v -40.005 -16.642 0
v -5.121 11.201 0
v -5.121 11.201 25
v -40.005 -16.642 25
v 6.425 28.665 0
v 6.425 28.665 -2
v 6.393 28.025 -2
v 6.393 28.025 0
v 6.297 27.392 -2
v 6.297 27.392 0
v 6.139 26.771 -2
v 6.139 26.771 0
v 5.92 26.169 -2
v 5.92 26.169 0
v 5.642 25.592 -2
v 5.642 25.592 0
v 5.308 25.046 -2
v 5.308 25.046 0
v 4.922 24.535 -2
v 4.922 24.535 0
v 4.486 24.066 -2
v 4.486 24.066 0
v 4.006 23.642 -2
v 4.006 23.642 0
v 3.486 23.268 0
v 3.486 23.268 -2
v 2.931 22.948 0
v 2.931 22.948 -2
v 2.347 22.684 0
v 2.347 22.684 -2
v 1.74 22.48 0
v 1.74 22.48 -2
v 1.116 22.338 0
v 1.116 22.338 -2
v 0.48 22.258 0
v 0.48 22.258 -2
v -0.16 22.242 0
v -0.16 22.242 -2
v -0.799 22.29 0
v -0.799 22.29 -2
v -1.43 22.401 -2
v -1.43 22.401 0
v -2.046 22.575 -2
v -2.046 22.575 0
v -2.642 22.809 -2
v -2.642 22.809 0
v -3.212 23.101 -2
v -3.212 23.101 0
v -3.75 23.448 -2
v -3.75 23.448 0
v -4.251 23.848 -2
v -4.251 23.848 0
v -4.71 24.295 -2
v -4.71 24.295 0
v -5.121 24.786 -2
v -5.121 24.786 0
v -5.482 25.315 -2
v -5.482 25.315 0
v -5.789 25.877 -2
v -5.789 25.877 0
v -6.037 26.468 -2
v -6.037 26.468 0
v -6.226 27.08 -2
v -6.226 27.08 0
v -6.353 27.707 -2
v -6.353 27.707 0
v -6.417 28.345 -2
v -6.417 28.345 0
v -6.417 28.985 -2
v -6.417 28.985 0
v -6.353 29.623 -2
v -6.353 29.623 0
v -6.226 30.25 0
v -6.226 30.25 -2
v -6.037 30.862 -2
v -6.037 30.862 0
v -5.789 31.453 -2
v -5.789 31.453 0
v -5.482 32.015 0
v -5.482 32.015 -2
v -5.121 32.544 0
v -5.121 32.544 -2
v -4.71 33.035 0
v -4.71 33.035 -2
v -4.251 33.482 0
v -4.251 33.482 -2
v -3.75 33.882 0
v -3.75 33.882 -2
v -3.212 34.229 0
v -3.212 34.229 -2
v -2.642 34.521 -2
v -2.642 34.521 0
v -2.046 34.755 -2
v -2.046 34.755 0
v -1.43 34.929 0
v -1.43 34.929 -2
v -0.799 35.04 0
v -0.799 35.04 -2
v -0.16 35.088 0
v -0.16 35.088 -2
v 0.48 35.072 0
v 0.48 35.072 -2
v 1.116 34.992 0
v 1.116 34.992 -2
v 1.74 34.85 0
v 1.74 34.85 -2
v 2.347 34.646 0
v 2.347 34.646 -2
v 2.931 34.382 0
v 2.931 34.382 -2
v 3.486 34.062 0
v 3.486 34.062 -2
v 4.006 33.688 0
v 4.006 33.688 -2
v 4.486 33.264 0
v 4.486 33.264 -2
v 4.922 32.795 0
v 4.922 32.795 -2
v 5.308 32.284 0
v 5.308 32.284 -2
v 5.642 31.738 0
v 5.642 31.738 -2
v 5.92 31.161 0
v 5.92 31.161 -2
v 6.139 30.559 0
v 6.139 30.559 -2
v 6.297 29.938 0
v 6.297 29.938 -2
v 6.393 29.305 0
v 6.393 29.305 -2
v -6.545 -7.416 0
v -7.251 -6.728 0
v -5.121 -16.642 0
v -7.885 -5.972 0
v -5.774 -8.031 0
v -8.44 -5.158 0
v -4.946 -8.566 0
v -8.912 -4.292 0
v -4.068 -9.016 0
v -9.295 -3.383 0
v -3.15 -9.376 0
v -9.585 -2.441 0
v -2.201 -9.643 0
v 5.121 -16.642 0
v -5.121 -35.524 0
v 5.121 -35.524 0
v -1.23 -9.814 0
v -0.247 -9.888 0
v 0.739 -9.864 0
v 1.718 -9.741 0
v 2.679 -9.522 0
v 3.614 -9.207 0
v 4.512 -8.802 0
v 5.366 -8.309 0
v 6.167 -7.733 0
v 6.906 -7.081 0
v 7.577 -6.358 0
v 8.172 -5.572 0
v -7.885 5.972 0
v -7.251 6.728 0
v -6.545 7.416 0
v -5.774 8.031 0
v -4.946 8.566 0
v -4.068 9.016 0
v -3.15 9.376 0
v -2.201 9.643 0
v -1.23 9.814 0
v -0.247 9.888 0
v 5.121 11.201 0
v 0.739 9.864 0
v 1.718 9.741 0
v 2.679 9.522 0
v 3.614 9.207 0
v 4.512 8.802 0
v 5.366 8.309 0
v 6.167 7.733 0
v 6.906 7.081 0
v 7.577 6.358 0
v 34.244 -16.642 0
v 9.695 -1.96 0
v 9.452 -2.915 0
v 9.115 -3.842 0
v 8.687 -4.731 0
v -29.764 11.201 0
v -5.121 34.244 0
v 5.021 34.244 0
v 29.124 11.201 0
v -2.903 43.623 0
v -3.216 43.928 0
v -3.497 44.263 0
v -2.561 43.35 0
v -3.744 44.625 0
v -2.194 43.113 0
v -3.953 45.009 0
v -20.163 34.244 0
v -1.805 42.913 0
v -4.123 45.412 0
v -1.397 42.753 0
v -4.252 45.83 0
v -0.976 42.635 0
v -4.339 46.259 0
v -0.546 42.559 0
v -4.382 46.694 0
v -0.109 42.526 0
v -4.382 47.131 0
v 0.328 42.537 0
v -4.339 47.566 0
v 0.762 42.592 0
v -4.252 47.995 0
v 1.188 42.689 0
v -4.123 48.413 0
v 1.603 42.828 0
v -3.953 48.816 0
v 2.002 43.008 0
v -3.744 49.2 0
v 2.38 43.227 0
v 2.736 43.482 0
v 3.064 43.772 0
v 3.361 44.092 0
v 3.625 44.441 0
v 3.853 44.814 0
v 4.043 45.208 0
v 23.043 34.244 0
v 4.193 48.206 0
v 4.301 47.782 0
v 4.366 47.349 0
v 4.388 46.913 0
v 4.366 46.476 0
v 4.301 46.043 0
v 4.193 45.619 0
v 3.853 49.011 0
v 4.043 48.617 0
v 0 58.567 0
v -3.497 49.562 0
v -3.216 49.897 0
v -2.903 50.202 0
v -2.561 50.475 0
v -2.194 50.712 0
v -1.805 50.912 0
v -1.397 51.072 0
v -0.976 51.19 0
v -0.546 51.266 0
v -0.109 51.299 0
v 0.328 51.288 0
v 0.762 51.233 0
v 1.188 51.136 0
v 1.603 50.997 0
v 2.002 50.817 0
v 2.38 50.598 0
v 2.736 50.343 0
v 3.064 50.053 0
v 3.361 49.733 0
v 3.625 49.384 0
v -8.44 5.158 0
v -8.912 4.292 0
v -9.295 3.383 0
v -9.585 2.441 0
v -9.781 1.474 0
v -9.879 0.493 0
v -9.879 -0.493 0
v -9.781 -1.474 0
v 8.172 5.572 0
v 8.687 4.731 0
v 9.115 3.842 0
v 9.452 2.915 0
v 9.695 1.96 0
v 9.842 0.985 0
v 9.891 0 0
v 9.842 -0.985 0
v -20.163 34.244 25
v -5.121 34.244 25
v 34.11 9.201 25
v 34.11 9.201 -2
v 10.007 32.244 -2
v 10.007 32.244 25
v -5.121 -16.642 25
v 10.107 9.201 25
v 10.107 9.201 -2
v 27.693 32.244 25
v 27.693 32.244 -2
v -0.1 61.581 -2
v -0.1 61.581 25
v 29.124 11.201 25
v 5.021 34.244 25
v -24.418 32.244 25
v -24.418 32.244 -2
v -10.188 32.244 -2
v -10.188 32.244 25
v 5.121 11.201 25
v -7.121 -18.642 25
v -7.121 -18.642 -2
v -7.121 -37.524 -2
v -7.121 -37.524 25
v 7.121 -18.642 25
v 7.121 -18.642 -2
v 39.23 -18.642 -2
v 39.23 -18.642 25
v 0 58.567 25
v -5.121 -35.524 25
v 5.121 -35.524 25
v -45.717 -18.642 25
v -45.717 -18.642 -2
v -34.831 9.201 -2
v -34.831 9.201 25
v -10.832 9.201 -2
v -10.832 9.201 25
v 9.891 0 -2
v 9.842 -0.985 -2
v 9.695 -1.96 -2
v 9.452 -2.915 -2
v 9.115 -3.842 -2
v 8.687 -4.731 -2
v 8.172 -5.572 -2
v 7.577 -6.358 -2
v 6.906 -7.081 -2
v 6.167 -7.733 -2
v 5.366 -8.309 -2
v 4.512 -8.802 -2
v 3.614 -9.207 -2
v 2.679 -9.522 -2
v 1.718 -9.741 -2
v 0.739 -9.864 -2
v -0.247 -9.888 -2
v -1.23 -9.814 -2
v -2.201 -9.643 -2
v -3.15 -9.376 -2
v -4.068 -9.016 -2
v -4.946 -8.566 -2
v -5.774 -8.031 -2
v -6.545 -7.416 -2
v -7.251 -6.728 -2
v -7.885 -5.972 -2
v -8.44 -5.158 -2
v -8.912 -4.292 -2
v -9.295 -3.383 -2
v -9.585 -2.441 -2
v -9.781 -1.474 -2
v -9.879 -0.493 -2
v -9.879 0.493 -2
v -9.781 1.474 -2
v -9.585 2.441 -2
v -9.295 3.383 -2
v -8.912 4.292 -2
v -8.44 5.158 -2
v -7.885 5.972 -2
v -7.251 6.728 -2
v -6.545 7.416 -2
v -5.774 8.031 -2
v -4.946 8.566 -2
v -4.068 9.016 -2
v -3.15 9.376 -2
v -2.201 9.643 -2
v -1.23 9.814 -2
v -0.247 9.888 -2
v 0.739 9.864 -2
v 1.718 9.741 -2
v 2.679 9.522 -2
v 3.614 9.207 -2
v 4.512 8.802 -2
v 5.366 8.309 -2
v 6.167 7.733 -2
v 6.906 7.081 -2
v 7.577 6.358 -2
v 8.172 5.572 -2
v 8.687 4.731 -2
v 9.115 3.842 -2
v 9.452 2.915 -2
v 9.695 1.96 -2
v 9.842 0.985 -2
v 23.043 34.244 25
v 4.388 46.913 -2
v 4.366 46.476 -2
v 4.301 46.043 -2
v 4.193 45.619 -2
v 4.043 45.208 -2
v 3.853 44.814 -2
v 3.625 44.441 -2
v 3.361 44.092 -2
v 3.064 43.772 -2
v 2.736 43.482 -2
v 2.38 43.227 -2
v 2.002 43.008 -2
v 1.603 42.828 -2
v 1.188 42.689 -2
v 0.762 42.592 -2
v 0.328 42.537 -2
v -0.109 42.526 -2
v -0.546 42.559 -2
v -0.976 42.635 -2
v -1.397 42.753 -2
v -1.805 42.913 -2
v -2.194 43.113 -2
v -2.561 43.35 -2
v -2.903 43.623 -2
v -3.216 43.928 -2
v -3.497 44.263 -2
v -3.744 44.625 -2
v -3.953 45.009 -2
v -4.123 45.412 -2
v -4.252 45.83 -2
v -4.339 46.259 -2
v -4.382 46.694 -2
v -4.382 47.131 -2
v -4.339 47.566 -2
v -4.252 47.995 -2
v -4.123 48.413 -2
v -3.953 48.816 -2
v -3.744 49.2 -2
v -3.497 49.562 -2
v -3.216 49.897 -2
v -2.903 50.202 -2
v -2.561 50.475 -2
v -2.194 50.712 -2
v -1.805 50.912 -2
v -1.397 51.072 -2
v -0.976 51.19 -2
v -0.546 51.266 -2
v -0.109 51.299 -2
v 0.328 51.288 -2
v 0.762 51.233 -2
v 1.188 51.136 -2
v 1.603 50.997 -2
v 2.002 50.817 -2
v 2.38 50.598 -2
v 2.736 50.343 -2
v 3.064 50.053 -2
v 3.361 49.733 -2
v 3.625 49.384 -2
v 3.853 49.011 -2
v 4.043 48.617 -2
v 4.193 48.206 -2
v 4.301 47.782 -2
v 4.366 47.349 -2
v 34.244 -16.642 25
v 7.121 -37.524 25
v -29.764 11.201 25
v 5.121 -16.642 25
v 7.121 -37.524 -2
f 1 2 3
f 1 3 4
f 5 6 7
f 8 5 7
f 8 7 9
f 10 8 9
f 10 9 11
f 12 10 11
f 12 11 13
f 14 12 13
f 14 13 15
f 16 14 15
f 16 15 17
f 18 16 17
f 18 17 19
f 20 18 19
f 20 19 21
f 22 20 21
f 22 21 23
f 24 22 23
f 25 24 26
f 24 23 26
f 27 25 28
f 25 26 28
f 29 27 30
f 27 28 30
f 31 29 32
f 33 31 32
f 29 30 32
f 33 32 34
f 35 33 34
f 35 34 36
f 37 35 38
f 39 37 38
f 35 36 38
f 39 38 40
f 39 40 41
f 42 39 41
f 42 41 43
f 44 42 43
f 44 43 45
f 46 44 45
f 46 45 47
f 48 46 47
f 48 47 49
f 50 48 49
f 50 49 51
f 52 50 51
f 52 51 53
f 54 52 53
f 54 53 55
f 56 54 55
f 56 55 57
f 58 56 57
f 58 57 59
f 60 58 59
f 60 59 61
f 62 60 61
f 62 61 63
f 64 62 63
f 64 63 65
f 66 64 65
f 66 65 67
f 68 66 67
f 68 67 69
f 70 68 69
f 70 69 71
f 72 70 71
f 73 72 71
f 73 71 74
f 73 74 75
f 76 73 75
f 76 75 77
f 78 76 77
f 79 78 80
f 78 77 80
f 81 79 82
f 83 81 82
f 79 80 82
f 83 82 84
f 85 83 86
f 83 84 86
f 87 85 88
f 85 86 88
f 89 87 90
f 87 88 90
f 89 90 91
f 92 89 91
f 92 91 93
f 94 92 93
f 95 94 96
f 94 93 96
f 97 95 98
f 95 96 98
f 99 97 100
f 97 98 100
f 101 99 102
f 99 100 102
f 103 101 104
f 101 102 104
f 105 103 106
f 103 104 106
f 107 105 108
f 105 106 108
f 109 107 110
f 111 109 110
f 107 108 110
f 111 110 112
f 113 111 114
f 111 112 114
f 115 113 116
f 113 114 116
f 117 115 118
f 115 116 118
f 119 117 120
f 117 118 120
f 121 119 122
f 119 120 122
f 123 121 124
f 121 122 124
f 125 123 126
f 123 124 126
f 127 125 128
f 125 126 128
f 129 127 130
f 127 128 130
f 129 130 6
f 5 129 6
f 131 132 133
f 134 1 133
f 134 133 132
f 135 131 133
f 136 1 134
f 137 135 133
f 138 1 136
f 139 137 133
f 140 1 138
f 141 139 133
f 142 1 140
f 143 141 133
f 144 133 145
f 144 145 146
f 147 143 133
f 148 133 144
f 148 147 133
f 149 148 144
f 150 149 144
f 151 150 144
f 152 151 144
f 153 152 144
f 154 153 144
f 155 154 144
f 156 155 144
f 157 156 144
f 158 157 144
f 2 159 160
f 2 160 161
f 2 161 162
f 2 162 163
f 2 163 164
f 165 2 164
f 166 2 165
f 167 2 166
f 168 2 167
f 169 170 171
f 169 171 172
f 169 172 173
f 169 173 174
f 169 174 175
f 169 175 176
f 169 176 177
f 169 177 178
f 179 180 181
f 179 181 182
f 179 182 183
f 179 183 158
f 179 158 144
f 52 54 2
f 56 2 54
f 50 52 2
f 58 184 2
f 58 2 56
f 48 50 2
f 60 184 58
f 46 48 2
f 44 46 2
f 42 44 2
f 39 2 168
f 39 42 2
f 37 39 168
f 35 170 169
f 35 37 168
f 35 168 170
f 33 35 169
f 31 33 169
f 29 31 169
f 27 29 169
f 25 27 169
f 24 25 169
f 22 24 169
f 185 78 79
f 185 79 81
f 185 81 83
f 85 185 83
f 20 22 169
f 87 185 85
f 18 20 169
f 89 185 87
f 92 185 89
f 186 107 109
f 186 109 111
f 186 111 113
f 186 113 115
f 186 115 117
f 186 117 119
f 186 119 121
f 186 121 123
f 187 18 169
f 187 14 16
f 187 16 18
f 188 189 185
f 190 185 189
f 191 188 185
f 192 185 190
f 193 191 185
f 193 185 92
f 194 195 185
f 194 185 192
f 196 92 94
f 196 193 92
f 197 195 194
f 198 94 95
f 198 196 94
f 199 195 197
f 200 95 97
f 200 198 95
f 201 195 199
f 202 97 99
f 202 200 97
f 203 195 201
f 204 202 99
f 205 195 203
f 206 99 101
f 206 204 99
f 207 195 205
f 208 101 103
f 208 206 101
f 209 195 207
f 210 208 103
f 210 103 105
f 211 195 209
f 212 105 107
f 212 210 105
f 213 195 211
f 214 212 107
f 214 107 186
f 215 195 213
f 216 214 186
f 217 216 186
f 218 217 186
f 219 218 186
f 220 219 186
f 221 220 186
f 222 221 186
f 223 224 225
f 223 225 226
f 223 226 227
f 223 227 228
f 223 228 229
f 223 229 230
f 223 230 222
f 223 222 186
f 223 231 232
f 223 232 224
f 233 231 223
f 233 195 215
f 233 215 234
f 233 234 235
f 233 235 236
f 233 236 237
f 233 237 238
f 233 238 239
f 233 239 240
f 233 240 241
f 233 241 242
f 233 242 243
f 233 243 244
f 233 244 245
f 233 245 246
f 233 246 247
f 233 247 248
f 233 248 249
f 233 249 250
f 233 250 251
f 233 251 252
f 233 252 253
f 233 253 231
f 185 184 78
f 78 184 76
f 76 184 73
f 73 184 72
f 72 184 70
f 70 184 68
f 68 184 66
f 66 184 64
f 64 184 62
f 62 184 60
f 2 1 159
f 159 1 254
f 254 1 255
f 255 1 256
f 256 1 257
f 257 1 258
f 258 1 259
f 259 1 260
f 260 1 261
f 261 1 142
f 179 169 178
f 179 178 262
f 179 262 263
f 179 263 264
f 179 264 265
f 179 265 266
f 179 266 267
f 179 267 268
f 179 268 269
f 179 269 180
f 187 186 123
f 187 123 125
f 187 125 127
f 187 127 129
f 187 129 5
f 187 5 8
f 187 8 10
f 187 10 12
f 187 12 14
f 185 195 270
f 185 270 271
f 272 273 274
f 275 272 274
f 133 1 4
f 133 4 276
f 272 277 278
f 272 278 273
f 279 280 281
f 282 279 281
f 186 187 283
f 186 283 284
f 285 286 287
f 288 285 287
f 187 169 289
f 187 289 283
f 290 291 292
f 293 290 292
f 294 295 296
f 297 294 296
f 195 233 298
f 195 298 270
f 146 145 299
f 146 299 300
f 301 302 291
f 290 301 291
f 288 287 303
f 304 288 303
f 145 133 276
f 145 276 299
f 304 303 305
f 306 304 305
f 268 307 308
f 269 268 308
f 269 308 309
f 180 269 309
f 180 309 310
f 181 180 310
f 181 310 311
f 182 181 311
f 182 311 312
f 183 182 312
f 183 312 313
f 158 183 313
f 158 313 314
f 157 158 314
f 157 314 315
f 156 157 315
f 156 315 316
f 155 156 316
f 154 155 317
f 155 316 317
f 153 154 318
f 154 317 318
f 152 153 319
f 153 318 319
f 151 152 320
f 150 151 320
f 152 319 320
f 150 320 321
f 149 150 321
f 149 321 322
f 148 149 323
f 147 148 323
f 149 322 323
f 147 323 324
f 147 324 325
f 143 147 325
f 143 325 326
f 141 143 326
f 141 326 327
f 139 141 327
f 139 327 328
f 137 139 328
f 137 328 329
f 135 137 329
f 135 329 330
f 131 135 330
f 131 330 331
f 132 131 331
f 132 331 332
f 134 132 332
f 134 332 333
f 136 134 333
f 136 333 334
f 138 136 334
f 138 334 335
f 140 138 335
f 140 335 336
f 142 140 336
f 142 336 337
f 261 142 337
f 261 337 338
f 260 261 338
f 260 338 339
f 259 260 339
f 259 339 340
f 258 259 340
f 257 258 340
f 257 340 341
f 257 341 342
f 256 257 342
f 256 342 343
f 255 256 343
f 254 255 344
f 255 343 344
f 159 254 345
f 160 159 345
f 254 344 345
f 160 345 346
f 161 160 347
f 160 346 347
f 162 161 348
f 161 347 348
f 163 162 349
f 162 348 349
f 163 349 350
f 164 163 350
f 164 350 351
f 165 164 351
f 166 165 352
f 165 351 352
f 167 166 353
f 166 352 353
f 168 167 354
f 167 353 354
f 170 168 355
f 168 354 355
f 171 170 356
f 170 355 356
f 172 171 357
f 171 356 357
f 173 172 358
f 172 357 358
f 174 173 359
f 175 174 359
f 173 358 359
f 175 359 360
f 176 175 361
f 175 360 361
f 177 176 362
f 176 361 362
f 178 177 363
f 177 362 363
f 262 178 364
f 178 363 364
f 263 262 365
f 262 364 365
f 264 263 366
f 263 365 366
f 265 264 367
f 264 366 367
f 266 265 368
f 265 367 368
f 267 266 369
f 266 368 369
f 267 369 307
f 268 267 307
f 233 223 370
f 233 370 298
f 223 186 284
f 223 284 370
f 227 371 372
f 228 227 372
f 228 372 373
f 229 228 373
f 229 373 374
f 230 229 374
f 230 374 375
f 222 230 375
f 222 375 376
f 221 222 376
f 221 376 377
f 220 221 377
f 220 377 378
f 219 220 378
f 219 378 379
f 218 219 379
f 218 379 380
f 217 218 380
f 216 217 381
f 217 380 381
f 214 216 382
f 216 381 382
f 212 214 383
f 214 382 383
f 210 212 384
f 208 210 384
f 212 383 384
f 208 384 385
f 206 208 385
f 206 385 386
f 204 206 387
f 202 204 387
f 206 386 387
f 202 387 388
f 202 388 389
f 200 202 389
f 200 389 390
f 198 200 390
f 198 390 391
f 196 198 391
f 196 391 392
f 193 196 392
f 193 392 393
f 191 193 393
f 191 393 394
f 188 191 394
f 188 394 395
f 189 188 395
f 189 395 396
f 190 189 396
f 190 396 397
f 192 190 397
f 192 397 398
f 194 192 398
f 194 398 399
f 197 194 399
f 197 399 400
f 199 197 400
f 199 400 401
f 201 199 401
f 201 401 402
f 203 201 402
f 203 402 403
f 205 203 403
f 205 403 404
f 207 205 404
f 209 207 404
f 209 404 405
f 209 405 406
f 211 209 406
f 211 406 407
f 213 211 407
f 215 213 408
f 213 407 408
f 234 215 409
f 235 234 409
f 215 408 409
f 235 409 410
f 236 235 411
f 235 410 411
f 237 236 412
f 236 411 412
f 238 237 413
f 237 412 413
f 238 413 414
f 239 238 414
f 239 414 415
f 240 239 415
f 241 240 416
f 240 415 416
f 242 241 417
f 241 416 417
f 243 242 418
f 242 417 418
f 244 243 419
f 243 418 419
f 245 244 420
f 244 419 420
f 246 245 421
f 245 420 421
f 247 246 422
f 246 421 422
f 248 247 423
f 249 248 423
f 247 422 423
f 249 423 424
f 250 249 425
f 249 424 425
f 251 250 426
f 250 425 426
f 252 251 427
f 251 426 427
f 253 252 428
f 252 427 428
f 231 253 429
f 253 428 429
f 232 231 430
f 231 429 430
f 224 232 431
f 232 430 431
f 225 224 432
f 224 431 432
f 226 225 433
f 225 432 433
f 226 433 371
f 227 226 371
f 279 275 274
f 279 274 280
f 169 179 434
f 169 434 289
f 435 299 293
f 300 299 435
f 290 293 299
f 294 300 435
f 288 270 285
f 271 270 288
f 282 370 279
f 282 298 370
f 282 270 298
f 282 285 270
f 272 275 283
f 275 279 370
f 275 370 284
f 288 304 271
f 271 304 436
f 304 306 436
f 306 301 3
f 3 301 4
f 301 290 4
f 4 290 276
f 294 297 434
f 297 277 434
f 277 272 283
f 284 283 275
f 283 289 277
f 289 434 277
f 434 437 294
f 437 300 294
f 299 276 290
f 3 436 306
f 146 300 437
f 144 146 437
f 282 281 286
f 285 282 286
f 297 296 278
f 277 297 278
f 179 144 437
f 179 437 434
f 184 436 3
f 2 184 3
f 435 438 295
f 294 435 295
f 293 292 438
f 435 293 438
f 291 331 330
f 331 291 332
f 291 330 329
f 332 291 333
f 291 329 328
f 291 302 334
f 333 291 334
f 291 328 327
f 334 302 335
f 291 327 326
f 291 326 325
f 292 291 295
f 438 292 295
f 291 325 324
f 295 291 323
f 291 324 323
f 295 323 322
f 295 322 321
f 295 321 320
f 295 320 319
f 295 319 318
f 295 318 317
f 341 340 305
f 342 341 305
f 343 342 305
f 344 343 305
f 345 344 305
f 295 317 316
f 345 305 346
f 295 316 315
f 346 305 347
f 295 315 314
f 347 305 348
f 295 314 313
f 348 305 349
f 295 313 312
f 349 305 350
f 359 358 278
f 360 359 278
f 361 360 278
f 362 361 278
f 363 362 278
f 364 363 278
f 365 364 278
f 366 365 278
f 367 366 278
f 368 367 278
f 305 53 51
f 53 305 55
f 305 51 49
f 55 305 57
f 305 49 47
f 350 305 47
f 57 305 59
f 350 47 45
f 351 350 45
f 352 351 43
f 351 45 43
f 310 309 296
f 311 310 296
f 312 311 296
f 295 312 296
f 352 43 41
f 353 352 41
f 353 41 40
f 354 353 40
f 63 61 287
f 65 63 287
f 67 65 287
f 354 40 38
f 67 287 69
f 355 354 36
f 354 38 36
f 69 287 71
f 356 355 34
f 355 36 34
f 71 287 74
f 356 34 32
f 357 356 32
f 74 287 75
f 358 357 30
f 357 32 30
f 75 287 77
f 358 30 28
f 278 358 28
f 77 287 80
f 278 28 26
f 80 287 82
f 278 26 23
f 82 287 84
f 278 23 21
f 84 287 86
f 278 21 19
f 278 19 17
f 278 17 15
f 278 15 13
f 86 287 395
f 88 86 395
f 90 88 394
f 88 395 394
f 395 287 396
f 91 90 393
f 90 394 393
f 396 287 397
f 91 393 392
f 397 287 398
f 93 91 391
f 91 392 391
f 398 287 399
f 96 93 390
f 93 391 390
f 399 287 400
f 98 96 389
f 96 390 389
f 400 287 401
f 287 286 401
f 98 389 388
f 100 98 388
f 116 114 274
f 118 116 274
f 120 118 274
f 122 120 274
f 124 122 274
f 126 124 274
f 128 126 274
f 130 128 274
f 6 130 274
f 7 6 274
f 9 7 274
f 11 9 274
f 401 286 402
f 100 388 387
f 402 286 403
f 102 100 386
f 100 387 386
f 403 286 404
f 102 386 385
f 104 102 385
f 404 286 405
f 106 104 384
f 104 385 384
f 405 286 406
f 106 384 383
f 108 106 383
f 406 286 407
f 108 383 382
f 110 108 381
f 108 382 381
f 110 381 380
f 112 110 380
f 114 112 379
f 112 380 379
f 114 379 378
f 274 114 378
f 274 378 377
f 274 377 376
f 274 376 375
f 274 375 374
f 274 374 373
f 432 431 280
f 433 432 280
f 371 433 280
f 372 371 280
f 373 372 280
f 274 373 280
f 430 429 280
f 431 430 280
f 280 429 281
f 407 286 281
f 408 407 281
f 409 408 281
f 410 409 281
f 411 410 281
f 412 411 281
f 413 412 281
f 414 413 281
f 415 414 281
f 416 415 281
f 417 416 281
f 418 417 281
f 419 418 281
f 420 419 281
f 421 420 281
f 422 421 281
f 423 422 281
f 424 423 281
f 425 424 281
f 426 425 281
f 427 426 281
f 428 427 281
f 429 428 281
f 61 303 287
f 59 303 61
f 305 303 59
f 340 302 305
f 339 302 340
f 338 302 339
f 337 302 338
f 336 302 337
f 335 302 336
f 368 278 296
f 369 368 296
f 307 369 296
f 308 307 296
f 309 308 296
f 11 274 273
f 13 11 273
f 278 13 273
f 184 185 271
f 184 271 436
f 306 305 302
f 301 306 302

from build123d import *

# Parameters (mm, degrees)
F1_DEPTH = 25
F2_T     = 2
F3_R     = 9.8912008391
F3_R_2   = 4.387511957
F3_R_3   = 6.4247632348
F4_DEPTH = 25


with BuildPart() as f1:
    # F0 (on Top) → F1 (new body)
    with BuildSketch(Plane.XY):
        Polygon((23.0428799987, 34.2442803085), (0, 58.5673190653), (-20.1625209302, 34.2442803085), (-5.1206401549, 34.2442803085), (-29.7637209296, 11.2014003098), (-5.1206401549, 11.2014003098), (-40.0050021708, -16.6420806199), (-5.1206401549, -16.6420806199), (-5.1206401549, -35.5244390666), (5.1206401549, -35.5244390666), (5.1206401549, -16.6420806199), (34.2442803085, -16.6420806199), (5.1206401549, 11.2014003098), (29.1236396879, 11.2014003098), (5.0213176084, 34.2442803085), align=None)
    extrude(amount=F1_DEPTH)

    # F2
    f2_openings = [f1.faces().sort_by_distance(p)[0] for p in [
        (-0.665195, 9.585773, 25),
    ]]
    offset(amount=F2_T, openings=f2_openings, kind=Kind.INTERSECTION)

    # F3 (on face) → F4 (cut)
    with BuildSketch(Plane(origin=(0, 0, -2), x_dir=(1, 0, 0), z_dir=(0, 0, -1))):
        Circle(F3_R)
        with Locations((0, -46.9125165525)):
            Circle(F3_R_2)
        with Locations((0, -28.6650005728)):
            Circle(F3_R_3)
    extrude(amount=-F4_DEPTH, mode=Mode.SUBTRACT)


solid = f1.part
